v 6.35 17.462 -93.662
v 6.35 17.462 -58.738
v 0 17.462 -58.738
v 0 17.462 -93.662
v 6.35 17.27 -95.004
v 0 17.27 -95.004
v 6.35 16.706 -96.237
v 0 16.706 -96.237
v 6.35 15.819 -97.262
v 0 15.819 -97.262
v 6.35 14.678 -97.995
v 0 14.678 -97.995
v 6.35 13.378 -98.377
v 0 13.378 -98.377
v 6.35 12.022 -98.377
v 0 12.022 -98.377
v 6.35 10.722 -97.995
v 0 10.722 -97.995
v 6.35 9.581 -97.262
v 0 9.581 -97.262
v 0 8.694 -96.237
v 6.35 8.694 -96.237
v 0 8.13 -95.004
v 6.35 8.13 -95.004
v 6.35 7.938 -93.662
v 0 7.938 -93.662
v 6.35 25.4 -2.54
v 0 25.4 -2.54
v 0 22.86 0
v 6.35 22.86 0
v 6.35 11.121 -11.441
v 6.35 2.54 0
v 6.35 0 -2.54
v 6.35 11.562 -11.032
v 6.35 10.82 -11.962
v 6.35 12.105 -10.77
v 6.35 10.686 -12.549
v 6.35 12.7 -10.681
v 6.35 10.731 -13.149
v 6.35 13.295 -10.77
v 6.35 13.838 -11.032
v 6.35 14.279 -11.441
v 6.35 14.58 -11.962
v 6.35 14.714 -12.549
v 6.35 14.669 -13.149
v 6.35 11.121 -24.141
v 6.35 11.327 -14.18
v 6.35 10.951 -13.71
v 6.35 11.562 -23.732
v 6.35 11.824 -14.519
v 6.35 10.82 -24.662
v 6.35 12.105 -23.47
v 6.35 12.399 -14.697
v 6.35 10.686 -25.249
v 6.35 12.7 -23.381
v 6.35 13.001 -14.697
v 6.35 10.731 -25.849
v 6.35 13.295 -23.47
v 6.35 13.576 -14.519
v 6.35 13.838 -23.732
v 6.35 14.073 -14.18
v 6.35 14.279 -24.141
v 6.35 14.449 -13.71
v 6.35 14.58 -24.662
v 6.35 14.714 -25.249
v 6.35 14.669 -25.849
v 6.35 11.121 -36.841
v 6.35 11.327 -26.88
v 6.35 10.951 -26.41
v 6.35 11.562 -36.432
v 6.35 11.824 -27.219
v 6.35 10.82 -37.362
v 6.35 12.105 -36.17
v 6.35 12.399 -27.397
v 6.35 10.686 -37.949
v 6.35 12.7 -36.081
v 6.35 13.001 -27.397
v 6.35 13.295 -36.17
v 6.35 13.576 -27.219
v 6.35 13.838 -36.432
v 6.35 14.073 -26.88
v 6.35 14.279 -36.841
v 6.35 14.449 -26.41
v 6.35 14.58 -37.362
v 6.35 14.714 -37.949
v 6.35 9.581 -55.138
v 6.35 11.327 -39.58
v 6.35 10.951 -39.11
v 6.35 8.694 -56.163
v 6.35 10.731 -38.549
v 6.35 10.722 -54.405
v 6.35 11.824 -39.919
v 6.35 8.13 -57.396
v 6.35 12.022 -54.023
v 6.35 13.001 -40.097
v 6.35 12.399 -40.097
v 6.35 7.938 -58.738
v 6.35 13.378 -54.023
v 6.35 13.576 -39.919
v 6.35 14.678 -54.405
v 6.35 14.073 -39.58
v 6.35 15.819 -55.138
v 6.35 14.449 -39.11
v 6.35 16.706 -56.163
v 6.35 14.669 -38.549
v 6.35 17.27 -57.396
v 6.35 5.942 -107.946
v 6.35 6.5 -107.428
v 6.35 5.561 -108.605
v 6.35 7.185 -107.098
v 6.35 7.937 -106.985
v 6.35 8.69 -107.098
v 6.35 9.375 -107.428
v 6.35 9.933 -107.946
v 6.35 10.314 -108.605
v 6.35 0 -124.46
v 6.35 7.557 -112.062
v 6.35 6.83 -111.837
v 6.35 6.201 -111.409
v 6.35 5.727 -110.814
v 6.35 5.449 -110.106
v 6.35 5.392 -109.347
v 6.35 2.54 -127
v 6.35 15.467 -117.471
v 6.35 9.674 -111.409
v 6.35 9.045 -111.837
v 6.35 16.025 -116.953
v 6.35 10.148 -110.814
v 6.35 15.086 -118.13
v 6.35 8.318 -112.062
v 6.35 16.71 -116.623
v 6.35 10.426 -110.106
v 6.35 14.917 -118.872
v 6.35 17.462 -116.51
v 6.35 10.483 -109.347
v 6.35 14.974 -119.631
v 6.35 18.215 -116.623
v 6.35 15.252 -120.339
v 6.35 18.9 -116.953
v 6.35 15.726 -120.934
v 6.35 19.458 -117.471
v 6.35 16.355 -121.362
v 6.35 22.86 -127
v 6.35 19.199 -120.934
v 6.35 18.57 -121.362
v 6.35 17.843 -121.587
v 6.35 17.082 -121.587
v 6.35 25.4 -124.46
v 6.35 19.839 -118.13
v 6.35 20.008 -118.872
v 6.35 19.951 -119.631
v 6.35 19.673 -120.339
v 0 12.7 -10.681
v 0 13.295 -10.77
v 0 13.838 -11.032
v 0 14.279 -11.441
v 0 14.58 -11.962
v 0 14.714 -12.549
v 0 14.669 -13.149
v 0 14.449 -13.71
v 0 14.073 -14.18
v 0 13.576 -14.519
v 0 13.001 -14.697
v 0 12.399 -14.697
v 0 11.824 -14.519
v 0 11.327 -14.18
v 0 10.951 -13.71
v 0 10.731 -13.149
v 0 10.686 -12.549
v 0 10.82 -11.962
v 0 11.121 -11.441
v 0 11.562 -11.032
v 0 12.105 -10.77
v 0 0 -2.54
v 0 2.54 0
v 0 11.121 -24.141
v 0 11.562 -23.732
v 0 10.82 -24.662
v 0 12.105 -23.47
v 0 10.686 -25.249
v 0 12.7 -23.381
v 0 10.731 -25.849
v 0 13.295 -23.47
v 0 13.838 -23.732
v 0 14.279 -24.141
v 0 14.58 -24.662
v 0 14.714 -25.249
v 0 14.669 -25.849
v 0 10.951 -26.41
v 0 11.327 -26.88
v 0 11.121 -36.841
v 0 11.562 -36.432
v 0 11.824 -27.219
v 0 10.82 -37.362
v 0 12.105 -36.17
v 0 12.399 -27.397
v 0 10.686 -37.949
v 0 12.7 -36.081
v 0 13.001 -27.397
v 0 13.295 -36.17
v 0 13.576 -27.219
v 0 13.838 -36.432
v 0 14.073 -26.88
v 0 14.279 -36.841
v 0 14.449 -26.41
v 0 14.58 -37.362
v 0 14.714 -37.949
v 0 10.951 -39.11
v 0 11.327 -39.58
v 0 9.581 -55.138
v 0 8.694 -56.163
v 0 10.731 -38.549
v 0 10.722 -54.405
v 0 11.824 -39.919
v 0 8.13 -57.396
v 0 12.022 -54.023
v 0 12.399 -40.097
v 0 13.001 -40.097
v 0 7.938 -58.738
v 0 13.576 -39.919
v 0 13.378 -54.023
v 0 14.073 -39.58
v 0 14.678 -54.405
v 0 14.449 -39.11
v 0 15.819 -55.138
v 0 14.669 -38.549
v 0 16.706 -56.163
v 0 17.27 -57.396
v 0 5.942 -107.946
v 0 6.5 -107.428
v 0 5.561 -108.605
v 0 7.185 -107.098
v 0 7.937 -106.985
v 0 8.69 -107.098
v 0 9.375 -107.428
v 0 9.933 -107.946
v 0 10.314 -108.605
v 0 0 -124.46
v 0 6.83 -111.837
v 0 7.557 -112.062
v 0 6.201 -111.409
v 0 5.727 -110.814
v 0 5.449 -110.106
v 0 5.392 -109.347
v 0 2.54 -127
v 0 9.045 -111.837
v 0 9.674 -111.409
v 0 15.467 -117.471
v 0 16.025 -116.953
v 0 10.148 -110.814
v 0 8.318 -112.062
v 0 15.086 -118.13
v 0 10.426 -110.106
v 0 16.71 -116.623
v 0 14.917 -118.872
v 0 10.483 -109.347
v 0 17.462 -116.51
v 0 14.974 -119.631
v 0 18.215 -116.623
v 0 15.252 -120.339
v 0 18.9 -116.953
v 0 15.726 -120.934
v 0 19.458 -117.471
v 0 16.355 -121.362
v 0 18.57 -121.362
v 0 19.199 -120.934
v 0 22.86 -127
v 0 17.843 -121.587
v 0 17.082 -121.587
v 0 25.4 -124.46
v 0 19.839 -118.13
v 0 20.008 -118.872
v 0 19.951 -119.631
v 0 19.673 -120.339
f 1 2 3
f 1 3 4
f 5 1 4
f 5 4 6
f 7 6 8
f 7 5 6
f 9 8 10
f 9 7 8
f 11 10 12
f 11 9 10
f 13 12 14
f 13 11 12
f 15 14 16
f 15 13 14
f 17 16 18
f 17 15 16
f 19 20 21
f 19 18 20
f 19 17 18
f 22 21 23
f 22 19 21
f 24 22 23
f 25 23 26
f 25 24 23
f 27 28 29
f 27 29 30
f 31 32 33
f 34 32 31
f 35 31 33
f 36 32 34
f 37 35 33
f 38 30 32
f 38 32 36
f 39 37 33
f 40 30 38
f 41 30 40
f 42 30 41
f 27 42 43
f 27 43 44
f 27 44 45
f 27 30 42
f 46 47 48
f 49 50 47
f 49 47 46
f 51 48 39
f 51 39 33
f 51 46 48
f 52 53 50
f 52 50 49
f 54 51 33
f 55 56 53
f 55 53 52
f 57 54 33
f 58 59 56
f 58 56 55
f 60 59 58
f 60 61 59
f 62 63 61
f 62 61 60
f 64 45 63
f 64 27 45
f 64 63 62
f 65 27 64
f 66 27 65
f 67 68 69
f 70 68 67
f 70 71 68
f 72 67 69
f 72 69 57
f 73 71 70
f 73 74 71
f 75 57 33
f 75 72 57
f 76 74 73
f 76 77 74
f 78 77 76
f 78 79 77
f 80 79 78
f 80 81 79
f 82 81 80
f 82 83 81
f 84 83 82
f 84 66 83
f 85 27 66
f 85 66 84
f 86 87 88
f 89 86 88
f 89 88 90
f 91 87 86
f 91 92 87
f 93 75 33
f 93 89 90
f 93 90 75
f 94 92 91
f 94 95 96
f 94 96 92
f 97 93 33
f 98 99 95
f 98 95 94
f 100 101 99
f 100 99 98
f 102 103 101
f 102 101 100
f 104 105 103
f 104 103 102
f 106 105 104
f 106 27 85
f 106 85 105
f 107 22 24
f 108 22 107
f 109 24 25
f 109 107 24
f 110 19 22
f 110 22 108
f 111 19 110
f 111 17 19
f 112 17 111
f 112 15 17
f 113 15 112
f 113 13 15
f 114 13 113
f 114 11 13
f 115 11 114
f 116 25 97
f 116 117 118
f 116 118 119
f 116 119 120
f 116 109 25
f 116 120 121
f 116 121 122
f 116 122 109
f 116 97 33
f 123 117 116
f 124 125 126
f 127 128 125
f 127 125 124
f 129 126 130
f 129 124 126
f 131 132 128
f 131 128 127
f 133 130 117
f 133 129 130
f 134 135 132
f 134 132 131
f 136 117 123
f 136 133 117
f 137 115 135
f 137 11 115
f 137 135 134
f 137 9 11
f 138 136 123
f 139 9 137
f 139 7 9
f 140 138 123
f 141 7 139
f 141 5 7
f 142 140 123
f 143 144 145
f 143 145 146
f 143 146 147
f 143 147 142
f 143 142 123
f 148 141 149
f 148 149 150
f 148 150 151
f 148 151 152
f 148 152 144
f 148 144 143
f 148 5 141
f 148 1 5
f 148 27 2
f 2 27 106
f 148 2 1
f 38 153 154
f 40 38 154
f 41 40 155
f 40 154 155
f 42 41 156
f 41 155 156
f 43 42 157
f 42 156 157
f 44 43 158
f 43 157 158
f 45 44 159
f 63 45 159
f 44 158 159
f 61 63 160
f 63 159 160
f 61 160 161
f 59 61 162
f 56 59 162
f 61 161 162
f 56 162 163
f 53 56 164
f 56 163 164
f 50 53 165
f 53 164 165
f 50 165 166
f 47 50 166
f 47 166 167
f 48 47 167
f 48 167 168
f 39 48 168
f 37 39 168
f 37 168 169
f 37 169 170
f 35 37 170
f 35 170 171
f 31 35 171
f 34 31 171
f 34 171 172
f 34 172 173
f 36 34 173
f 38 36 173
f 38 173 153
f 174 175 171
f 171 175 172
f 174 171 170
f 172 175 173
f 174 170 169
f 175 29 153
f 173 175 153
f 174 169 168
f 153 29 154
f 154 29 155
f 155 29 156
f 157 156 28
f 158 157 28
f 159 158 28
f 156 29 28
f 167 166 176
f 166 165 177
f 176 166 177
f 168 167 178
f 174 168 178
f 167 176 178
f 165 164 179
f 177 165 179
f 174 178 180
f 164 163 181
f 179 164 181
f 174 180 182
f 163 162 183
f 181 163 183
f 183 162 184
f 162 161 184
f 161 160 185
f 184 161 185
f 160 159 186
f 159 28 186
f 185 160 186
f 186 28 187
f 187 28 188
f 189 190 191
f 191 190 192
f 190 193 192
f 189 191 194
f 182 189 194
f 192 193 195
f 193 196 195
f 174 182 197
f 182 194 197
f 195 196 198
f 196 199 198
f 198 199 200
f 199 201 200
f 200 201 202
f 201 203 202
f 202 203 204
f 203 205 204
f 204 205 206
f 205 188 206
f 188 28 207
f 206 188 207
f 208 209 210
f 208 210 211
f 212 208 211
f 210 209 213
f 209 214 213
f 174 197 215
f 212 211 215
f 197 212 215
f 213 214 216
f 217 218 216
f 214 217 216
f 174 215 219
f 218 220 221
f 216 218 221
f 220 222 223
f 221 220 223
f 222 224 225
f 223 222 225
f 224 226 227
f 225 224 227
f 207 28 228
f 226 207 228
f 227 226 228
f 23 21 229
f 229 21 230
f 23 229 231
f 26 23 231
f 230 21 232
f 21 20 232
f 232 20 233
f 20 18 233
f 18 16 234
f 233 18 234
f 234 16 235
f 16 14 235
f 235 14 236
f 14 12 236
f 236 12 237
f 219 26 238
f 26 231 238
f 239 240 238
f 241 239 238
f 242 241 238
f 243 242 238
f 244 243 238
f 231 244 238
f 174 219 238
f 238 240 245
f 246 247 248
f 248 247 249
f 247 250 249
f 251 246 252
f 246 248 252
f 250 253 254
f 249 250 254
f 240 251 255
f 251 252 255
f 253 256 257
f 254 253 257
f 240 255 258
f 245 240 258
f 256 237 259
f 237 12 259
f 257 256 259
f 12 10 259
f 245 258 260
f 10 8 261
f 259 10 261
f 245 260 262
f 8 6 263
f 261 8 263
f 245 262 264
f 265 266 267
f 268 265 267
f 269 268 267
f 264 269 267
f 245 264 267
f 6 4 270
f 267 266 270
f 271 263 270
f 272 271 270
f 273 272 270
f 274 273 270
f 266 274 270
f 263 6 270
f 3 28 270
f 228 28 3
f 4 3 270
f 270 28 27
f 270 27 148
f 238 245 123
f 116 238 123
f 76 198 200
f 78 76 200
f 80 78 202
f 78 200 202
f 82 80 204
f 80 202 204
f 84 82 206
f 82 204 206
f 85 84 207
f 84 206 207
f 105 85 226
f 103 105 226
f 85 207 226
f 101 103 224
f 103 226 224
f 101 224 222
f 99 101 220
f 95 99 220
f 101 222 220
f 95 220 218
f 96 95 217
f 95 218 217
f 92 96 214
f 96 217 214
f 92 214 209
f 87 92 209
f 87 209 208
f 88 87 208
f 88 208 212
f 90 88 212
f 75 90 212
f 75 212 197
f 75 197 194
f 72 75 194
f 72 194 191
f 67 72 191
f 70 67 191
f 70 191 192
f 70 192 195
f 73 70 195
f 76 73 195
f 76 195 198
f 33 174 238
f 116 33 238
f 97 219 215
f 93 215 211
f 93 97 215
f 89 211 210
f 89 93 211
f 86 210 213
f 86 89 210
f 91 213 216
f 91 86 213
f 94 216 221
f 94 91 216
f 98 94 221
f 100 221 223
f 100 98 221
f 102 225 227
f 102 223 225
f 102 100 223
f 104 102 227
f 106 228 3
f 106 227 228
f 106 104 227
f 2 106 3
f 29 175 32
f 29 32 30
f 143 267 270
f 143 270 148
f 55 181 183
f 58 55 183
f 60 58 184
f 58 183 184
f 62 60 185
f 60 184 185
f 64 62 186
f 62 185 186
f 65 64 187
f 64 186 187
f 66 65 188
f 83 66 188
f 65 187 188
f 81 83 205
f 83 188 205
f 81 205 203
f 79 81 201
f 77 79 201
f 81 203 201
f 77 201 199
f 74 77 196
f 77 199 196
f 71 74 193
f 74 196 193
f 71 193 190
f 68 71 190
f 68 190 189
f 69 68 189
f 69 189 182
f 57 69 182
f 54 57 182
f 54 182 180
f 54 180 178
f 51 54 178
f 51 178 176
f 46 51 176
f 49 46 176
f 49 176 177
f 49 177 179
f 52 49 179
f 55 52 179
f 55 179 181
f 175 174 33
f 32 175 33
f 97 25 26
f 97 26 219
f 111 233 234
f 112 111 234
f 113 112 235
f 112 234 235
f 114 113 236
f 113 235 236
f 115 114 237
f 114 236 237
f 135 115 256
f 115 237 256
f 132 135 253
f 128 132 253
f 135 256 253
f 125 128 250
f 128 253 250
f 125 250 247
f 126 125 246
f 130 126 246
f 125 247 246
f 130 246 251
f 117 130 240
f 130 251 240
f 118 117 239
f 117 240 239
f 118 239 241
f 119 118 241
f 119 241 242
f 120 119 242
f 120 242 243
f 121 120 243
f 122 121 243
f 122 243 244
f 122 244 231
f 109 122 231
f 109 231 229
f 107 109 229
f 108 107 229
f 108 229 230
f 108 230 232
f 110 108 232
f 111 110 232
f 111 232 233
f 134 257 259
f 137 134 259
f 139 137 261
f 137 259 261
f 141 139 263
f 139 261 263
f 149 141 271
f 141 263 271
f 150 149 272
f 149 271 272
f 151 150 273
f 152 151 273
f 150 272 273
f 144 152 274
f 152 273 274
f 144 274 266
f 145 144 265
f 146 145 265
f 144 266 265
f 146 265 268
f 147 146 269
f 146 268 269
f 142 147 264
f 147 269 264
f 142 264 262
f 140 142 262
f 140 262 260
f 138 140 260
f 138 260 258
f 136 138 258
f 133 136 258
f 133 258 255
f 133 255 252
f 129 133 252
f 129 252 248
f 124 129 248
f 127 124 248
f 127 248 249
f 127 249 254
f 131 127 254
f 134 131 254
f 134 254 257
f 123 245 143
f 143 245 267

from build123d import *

# Parameters (mm, degrees)
SKETCH1_W              = 127
SKETCH1_H              = 25.4
BOSS_EXTRUDE1_DEPTH    = 6.35
F_10_32_TAPPED_HOLE1_D = 4.0386
F_10_CLEARANCE_HOLE1_D = 5.1054
CHAMFER1_SIZE          = 2.54
CUT_EXTRUDE1_DEPTH     = 7.35


with BuildPart() as part:
    # Sketch1 → Boss-Extrude1 (new body)
    with BuildSketch(Plane(origin=(0, 0, 0), x_dir=(0, 0, -1), z_dir=(1, 0, 0))):
        with Locations((63.5, 12.7)):
            Rectangle(SKETCH1_W, SKETCH1_H)
    extrude(amount=BOSS_EXTRUDE1_DEPTH)

    # #10-32 Tapped Hole1 (through all)
    with Locations(Plane(origin=(6.35, 0, 0), x_dir=(0, 0, -1), z_dir=(1, 0, 0))):
        with Locations((12.7, 12.7), (25.4, 12.7), (38.1, 12.7)):
            Hole(F_10_32_TAPPED_HOLE1_D / 2)

    # #10 Clearance Hole1 (through all)
    with Locations(Plane(origin=(6.35, 0, 0), x_dir=(0, 0, -1), z_dir=(1, 0, 0))):
        with Locations((119.0625, 17.4625), (109.5375, 7.9375)):
            Hole(F_10_CLEARANCE_HOLE1_D / 2)

    # Chamfer1
    chamfer1_edges = [part.edges().sort_by_distance(p)[0] for p in [
        (3.175, 25.4, 0),
        (3.175, 25.4, -127),
        (3.175, 0, -127),
        (3.175, 0, 0),
    ]]
    chamfer(chamfer1_edges, length=CHAMFER1_SIZE)

    # Sketch6 → Cut-Extrude1 (cut, through all)
    with BuildSketch(Plane(origin=(6.35, 0, 0), x_dir=(0, 0, -1), z_dir=(1, 0, 0))):
        with BuildLine():
            Line((93.6625, 7.9375), (58.7375, 7.9375))
            ThreePointArc((58.7375, 7.9375), (53.975, 12.7), (58.7375, 17.4625))
            Line((58.7375, 17.4625), (93.6625, 17.4625))
            ThreePointArc((93.6625, 17.4625), (98.425, 12.7), (93.6625, 7.9375))
        make_face()
    extrude(amount=-CUT_EXTRUDE1_DEPTH, mode=Mode.SUBTRACT)


solid = part.part
